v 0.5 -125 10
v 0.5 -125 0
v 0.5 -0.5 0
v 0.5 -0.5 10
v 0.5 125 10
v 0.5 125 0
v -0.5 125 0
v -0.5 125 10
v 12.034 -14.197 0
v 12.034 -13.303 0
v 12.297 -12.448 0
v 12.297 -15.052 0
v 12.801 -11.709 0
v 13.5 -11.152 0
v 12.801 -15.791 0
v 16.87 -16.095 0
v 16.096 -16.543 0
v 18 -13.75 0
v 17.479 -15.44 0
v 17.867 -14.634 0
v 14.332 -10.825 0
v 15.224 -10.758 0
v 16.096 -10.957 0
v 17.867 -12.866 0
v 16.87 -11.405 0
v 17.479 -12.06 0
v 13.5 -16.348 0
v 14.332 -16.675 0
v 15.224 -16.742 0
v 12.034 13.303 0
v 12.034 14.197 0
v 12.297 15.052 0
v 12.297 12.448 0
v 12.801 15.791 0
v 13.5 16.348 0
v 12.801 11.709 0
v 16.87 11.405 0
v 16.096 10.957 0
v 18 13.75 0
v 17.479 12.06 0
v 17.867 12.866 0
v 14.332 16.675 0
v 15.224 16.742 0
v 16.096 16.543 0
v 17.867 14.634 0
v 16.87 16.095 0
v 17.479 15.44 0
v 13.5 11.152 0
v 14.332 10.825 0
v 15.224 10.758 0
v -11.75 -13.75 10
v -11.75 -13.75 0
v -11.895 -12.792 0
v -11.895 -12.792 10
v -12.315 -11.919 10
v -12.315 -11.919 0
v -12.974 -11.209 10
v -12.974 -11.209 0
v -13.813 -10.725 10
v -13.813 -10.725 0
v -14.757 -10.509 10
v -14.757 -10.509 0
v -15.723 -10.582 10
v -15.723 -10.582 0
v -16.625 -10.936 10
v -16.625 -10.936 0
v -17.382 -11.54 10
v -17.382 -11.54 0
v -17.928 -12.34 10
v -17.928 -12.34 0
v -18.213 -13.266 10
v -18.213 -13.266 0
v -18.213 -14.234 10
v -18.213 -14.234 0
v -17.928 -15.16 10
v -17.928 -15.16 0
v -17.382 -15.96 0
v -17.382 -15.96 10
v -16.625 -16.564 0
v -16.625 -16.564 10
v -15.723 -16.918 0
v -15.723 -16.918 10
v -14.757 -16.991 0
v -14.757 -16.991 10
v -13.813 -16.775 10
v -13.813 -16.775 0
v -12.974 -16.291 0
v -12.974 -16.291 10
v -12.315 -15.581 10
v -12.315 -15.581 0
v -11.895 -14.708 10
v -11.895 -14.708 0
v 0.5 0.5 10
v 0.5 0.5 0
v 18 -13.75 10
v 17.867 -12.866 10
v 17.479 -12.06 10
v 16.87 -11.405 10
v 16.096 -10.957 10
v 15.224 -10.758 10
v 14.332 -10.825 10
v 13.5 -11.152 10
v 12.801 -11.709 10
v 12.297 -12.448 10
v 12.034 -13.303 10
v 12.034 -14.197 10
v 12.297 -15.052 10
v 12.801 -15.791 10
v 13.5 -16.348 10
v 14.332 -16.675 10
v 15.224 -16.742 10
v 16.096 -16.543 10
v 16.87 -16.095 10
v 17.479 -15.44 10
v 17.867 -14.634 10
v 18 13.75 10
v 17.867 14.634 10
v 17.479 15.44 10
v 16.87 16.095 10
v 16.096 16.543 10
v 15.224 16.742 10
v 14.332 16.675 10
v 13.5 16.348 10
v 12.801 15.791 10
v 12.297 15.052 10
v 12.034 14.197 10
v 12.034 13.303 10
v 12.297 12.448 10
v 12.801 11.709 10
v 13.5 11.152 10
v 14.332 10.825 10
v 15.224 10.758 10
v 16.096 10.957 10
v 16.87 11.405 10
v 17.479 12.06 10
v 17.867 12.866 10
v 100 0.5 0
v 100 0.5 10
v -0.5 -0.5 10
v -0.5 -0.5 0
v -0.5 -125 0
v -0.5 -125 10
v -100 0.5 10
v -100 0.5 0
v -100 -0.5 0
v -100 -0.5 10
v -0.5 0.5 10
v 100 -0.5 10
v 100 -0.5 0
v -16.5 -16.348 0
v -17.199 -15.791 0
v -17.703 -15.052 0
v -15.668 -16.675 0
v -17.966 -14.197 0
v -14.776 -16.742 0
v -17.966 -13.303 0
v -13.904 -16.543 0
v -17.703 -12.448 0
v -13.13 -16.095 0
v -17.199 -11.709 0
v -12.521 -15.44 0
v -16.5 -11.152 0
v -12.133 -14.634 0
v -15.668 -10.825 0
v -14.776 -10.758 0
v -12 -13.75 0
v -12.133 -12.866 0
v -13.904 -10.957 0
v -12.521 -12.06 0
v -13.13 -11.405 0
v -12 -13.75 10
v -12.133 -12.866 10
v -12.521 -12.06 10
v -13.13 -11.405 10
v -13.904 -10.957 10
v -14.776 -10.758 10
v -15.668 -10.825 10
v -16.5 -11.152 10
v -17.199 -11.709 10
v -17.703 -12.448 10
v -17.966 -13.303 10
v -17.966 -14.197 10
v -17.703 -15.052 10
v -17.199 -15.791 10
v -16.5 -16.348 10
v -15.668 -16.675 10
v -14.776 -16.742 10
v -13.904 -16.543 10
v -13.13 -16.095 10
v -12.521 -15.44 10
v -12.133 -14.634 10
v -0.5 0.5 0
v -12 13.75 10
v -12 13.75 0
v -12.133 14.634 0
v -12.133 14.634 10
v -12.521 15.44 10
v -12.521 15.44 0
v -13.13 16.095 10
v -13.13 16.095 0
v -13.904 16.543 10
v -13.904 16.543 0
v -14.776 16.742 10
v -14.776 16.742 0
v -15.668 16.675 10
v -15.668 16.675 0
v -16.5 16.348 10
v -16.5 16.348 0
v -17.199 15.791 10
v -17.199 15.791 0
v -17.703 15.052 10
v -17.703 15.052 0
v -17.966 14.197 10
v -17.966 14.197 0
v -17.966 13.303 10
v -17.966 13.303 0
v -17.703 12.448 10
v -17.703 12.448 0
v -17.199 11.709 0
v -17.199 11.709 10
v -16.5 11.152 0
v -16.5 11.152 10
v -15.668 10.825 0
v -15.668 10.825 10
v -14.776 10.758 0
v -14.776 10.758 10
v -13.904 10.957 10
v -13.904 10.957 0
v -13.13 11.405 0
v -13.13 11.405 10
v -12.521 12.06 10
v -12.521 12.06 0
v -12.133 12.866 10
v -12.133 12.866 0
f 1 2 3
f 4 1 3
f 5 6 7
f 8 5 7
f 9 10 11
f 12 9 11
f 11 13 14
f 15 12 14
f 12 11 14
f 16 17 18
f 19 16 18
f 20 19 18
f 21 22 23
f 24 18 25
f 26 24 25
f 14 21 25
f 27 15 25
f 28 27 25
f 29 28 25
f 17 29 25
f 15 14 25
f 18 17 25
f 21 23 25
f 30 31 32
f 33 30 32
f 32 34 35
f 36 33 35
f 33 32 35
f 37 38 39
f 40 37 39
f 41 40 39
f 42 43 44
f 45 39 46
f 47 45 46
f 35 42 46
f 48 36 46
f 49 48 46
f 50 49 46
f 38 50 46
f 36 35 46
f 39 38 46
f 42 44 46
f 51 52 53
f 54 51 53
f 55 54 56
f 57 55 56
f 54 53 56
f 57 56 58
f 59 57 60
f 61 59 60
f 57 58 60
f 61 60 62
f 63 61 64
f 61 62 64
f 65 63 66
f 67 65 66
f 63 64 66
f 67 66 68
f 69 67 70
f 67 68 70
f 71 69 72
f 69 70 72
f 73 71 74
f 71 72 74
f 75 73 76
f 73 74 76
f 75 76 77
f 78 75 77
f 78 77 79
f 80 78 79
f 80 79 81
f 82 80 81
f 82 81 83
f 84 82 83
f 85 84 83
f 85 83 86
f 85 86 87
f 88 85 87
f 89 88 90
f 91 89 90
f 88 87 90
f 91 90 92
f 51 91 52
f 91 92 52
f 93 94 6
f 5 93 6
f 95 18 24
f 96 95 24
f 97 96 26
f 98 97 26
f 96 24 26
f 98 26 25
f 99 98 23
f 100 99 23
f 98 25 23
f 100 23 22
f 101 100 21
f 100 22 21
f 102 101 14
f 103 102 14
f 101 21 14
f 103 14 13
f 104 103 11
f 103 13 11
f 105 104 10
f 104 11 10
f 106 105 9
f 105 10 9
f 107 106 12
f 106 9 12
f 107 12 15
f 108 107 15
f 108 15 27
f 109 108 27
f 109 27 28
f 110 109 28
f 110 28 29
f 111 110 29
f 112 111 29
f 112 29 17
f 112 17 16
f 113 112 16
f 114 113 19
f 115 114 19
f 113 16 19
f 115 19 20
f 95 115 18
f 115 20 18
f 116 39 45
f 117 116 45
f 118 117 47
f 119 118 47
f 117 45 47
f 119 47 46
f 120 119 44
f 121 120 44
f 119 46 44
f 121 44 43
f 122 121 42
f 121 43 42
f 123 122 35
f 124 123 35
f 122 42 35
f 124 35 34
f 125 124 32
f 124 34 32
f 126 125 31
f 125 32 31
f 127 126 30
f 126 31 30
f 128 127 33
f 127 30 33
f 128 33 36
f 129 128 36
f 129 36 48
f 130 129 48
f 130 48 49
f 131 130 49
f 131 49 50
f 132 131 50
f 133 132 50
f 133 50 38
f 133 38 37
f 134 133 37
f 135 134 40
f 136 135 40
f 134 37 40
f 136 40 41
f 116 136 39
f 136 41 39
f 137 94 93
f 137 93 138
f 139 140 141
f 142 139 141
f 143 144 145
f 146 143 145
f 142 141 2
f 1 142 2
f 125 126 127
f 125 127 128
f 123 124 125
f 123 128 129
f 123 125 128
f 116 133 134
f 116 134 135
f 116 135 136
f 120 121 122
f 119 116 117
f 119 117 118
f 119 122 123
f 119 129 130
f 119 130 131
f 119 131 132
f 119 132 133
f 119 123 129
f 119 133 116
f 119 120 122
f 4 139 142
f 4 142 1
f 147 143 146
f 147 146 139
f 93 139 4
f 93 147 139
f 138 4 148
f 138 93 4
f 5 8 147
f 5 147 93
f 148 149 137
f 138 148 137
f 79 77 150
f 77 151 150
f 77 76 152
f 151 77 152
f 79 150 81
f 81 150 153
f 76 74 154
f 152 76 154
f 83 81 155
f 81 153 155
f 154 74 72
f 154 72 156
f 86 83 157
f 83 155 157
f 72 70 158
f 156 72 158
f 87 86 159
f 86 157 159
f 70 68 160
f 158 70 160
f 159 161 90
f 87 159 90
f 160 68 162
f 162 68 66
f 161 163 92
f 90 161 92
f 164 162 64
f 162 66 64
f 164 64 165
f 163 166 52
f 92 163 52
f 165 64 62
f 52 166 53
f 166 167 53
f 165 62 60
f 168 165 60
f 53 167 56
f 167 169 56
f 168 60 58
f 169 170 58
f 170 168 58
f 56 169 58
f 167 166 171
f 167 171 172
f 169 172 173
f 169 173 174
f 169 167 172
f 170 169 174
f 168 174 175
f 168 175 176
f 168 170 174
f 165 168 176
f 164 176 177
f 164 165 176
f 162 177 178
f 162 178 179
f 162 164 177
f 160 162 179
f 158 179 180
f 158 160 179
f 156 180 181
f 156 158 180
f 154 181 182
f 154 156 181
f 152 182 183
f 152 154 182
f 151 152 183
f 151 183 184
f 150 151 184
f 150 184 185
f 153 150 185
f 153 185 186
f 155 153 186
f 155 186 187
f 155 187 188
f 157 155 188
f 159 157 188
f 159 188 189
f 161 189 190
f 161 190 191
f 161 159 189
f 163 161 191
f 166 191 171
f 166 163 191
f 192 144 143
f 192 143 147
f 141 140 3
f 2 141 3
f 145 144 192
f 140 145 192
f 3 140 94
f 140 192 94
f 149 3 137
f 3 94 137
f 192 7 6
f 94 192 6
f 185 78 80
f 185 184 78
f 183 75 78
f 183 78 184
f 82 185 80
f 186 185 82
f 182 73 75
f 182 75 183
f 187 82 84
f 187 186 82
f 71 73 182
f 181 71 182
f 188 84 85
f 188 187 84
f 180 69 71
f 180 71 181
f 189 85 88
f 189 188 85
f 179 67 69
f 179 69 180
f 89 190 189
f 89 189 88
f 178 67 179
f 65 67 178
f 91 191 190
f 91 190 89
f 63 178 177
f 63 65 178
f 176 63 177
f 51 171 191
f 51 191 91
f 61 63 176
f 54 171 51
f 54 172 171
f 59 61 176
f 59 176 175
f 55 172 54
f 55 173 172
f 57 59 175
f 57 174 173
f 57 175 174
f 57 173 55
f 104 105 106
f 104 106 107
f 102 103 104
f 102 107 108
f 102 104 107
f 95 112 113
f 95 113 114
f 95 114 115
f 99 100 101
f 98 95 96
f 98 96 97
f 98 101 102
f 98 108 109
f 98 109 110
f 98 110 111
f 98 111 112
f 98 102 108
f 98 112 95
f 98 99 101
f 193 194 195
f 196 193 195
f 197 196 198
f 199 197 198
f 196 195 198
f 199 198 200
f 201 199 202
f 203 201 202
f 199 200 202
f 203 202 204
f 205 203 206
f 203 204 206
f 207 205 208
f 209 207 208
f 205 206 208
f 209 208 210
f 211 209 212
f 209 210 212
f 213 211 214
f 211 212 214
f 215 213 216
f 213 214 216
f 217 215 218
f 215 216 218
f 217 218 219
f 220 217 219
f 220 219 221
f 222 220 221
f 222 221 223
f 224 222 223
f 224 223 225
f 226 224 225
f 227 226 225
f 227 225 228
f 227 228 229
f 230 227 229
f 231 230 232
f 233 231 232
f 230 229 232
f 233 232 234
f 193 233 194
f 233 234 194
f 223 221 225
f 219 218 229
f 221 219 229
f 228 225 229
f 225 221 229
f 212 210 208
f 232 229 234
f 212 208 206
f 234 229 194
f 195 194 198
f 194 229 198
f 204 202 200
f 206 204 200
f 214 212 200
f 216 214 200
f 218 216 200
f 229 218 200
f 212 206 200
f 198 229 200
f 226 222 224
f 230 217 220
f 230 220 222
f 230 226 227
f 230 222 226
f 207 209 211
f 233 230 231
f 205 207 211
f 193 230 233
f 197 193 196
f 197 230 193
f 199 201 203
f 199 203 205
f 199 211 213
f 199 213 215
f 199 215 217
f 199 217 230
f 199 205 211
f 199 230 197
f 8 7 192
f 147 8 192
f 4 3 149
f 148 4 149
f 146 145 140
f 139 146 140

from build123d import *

# Parameters (mm, degrees)
F0_R     = 3
F1_DEPTH = 10
F0_R_2   = 3.2496779571
F0_W     = 0.5
F0_H     = 0.5
F0_W_2   = 99.5


with BuildPart() as f1:
    # F0 (on Top) → F1 (new body)
    with BuildSketch(Plane.XY):
        with Locations((-15, 13.75)):
            Circle(F0_R)
    extrude(amount=F1_DEPTH)


with BuildPart() as f1b:
    # F0 (on Top) → F1, piece 2 (new body)
    with BuildSketch(Plane.XY):
        with Locations((-15, -13.75)):
            Circle(F0_R_2)
        with Locations((-15, -13.75)):
            Circle(F0_R, mode=Mode.SUBTRACT)
    extrude(amount=F1_DEPTH)


with BuildPart() as f1c:
    # F0 (on Top) → F1, piece 3 (new body)
    with BuildSketch(Plane.XY):
        with Locations((15, 13.75)):
            Circle(F0_R)
    extrude(amount=F1_DEPTH)


with BuildPart() as f1d:
    # F0 (on Top) → F1, piece 4 (new body)
    with BuildSketch(Plane.XY):
        with Locations((15, -13.75)):
            Circle(F0_R)
    extrude(amount=F1_DEPTH)


with BuildPart() as f1e:
    # F0 (on Top) → F1, piece 5 (new body)
    with BuildSketch(Plane.XY):
        with Locations((-0.25, 0.25)):
            Rectangle(F0_W, F0_H)
        with Locations((0.25, -0.25)):
            Rectangle(F0_W, F0_H)
        with Locations((-0.25, -0.25)):
            Rectangle(F0_W, F0_H)
        with Locations((0.25, 0.25)):
            Rectangle(F0_W, F0_H)
        Polygon((-0.5, 0.5), (0, 0.5), (0.5, 0.5), (0.5, 125), (-0.5, 125), align=None)
        Polygon((0.5, -0.5), (0, -0.5), (-0.5, -0.5), (-0.5, -125), (0.5, -125), align=None)
        with Locations((-50.25, -0.25)):
            Rectangle(F0_W_2, F0_H)
        with Locations((-50.25, 0.25)):
            Rectangle(F0_W_2, F0_H)
        with Locations((50.25, 0.25)):
            Rectangle(F0_W_2, F0_H)
        with Locations((50.25, -0.25)):
            Rectangle(F0_W_2, F0_H)
    extrude(amount=F1_DEPTH)


solid = Compound([f1.part, f1b.part, f1c.part, f1d.part, f1e.part])
